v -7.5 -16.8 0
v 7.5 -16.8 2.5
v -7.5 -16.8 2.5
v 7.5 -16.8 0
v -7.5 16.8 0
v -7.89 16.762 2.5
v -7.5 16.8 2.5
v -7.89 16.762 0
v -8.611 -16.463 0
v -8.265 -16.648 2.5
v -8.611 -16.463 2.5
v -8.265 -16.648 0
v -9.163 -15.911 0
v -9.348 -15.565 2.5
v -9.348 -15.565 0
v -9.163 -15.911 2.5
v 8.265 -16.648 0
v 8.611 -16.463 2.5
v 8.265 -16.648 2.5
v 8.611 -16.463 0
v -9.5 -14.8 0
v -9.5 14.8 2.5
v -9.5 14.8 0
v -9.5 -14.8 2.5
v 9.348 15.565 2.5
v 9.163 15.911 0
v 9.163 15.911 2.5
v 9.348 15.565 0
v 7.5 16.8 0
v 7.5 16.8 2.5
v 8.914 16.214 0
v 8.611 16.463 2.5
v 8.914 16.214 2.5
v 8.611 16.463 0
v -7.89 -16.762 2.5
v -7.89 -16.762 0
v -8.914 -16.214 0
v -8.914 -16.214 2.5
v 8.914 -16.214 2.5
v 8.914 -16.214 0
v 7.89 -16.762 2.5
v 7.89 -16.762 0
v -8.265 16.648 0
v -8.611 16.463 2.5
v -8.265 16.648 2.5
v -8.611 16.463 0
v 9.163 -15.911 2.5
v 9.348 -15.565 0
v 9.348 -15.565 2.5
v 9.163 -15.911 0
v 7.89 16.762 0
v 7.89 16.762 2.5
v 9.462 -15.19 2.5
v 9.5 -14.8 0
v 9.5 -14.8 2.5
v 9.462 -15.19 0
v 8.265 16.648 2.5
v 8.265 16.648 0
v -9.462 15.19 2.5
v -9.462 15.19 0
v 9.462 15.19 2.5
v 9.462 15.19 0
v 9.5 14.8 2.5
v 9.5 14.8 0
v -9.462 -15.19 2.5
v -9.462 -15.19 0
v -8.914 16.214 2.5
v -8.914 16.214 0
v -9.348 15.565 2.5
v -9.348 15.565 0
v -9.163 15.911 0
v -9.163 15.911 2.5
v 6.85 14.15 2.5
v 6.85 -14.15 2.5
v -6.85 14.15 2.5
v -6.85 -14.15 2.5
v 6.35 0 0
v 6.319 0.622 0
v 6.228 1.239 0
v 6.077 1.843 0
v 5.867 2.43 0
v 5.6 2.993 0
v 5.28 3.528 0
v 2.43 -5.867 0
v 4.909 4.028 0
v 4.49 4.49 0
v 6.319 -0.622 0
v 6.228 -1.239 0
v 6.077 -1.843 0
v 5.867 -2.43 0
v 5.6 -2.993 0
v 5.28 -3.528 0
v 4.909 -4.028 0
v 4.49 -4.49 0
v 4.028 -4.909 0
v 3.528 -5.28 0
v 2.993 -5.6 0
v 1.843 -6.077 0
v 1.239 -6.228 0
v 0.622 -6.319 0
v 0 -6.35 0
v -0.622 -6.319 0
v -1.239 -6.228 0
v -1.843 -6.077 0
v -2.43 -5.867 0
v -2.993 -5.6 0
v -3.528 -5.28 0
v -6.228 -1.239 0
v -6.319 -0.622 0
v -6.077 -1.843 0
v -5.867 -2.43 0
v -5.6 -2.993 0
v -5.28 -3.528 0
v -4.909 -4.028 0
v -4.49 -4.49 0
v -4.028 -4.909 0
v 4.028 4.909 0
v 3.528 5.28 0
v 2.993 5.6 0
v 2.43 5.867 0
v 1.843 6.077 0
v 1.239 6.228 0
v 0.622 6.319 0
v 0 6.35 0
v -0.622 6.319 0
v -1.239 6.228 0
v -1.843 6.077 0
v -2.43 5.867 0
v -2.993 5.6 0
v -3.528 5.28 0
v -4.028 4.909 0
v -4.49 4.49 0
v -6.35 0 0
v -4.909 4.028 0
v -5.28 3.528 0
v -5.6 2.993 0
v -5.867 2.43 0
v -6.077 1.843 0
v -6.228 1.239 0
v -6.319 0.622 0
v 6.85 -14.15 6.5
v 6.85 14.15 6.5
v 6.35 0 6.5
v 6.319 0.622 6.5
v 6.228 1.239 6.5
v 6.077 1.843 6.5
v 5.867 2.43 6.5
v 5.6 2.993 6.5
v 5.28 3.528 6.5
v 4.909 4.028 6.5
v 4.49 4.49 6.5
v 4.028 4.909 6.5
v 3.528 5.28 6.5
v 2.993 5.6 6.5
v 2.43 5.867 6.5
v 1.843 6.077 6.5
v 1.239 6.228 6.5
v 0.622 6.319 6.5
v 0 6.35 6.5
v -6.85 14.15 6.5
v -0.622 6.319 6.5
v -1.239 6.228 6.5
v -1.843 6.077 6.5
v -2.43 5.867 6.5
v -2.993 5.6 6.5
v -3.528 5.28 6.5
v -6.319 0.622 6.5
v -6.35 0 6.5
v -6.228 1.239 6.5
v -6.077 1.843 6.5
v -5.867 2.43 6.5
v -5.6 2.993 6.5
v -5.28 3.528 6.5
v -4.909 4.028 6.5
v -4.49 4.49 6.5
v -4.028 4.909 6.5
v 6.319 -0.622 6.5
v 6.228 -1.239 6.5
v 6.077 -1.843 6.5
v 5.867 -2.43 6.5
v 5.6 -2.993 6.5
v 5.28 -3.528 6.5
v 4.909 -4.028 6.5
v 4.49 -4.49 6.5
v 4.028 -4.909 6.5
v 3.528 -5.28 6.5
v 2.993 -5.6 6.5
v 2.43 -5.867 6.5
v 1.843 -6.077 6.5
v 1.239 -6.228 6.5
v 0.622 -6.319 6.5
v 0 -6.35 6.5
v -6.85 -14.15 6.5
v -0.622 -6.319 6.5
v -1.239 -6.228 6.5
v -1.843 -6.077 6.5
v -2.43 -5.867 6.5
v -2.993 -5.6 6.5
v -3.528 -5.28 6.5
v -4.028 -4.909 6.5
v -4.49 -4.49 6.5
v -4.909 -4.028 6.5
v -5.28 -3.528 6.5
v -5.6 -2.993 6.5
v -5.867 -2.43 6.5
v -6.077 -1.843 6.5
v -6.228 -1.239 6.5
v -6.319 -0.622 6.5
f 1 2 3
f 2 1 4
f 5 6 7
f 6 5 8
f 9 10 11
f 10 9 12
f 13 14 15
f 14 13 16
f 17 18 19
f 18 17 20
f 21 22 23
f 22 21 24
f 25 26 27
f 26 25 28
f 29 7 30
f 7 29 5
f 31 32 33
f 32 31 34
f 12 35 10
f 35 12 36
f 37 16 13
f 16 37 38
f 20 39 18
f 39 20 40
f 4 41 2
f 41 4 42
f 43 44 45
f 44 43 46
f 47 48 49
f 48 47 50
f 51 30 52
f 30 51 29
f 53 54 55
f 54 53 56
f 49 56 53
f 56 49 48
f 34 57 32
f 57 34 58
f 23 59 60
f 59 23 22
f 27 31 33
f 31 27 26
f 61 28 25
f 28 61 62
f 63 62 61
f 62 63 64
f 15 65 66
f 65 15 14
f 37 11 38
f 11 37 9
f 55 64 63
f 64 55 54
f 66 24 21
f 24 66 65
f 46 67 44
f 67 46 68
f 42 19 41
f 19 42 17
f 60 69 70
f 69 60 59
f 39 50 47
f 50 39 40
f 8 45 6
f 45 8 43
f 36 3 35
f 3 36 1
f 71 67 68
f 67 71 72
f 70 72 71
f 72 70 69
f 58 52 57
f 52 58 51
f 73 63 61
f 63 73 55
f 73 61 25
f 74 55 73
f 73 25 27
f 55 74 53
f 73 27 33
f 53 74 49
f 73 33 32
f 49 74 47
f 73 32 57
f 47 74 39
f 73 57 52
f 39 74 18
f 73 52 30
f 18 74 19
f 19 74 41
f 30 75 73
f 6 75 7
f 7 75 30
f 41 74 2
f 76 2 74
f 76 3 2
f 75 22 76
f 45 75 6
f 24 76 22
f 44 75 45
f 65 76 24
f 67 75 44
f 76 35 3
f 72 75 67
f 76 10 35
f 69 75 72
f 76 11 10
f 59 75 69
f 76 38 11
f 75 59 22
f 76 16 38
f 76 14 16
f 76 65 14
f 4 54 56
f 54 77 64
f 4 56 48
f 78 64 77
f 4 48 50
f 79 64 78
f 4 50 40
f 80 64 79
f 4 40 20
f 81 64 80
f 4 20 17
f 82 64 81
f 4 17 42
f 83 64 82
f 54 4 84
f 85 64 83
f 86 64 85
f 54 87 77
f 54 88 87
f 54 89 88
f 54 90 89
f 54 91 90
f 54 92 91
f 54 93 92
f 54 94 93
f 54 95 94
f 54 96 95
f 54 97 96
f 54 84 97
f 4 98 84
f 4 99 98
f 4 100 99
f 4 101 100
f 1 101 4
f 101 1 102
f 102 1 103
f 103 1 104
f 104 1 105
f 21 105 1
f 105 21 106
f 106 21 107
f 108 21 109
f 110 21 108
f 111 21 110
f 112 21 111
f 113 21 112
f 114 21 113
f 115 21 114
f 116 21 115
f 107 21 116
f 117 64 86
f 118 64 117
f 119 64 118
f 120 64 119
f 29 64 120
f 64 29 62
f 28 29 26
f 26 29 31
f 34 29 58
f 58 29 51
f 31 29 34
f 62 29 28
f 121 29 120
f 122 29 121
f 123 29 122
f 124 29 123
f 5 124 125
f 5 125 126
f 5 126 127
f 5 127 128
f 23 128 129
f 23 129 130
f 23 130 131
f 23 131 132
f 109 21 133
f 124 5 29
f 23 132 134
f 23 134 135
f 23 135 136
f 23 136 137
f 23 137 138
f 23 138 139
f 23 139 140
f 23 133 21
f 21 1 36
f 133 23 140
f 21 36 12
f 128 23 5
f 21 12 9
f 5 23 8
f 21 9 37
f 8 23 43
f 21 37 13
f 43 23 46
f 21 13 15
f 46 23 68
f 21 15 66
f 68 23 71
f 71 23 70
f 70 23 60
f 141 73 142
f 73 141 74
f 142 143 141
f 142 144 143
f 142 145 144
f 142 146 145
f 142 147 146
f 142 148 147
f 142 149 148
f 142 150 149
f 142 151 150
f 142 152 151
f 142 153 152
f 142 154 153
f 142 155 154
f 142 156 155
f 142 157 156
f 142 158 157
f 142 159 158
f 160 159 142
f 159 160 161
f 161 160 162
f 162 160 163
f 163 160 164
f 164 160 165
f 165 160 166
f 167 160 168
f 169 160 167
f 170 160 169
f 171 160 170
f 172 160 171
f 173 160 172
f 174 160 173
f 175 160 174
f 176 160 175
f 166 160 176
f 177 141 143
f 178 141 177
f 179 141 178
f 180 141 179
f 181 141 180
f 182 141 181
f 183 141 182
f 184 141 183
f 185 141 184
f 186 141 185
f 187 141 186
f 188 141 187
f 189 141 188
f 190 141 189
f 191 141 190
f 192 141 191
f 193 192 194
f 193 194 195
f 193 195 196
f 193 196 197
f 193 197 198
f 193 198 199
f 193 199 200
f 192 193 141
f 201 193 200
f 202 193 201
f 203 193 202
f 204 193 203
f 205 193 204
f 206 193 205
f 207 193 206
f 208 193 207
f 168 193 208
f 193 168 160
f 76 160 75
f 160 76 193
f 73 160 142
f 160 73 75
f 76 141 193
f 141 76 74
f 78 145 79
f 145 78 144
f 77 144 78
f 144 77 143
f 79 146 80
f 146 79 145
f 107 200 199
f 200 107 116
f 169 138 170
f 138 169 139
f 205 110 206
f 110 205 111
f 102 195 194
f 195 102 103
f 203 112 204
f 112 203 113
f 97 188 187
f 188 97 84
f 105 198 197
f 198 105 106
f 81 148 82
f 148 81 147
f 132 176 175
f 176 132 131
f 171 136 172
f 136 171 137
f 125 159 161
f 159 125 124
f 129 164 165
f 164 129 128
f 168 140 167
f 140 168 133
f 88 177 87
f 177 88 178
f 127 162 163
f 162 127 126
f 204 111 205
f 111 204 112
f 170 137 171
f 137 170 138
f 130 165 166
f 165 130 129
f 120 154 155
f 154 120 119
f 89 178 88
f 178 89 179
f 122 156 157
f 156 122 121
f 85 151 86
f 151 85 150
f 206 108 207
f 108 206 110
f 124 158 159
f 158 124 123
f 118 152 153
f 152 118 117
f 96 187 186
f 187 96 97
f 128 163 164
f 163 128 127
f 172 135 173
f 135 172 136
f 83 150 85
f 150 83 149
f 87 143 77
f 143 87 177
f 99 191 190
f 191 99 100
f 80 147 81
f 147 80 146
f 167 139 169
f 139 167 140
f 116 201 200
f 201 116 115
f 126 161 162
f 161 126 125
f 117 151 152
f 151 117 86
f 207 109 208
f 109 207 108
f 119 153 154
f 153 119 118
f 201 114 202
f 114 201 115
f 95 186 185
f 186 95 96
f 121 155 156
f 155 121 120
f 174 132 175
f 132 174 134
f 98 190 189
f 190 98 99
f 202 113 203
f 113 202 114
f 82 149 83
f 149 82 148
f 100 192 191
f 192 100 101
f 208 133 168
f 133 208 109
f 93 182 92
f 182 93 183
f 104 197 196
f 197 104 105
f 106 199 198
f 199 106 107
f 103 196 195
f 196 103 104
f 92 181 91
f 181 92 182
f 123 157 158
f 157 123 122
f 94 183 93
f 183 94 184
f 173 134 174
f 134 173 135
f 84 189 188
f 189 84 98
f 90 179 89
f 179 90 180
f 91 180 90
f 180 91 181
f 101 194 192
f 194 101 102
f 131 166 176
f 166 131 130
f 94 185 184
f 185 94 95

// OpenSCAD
// ============================================================
// Rocker-to-Toggle Switch Adapter Plate
// ============================================================
// Fills a Gardner Bender GSW-41 rocker switch panel cutout and
// provides a mounting hole for a standard toggle switch.
//
// Rocker switch cutout (GSW-41): 0.550" x 1.125" (14mm x 28.58mm)
//
// HOW TO USE:
//   1. Measure your toggle switch bushing/thread outer diameter
//   2. Set `toggle_hole_dia` to that value (see notes below)
//   3. Measure your enclosure panel thickness; set `panel_thickness`
//   4. Print with PLA/PETG, 3+ perimeters, 30%+ infill, no supports
//   5. Press adapter into the cutout from the outside; the flange
//      sits flush on the panel surface. Secure with toggle switch
//      nut from the inside.
//
// PRINT ORIENTATION: flange face DOWN on the build plate.
// ============================================================

// ---------- KEY PARAMETERS (adjust these) ----------

// Outer diameter of your toggle switch bushing/threads (mm).
// Gardner Bender GSW-series toggle switches (GSW-18, GSW-124, etc.)
// require a 1/2" (12.7 mm) panel hole.
//
// Common values:
//   6.0  = mini toggle (small/inexpensive units)
//   6.35 = 1/4" standard toggle
//  12.0  = 15/32" medium toggle
//  12.7  = 1/2" full-size toggle (Gardner Bender GSW series default)
//
// ⚠ IMPORTANT — narrow-wall warning:
// The rocker cutout is only 14 mm wide. With a 12.7 mm hole the
// wall on each side is ~0.5 mm. This is thin but acceptable because
// the toggle's locking nut (tightened from inside the box) provides
// the retention force. Use 3+ perimeters and 100% infill, or print
// in PETG for extra toughness.
toggle_hole_dia = 12.7;

// Thickness of the panel the rocker switch was mounted in (mm).
// Measure with calipers. A typical ABS/polycarbonate project box
// wall is 2–4mm. Use 3.0 as a starting estimate.
panel_thickness = 3.0;

// ---------- ROCKER CUTOUT DIMENSIONS (GSW-41, do not change) ----------
rocker_w = 14.0;   // 0.550" = 13.97 mm
rocker_h = 28.6;   // 1.125" = 28.58 mm

// ---------- FIT & GEOMETRY PARAMETERS ----------

// Reduce plug body by this amount (each side) for press-fit clearance.
// 0.15 mm per side (0.3 mm total) works well on most FDM printers.
// Increase to 0.2 if it's too tight after printing.
fit_clearance = 0.15;

// How far the flange lip overhangs the cutout on each side (mm).
flange_overhang = 2.5;

// Thickness of the flange (the visible face plate).
flange_thickness = 2.5;

// Corner radius on the flange (cosmetic).
flange_corner_r  = 2.0;

// Extra plug depth beyond the panel so the fit has some grip
// before the toggle nut is tightened. 1 mm is plenty.
plug_extra_depth = 1.0;

// ---------- DERIVED DIMENSIONS (do not edit) ----------
plug_w     = rocker_w - fit_clearance * 2;
plug_h_dim = rocker_h - fit_clearance * 2;
plug_depth = panel_thickness + plug_extra_depth;

flange_w = rocker_w + flange_overhang * 2;
flange_h = rocker_h + flange_overhang * 2;

total_height = flange_thickness + plug_depth;

// ============================================================
// MODEL
// Print orientation: flange face on build plate (Z=0).
// Z increases upward through the plug.
// ============================================================
difference() {
    union() {
        // Flange — rests on panel exterior, centered at (0,0)
        rounded_rect(flange_w, flange_h, flange_thickness, flange_corner_r);

        // Plug body — inserts into the rocker cutout
        // Cube bottom starts at z=flange_thickness; center=true needs
        // the translate at the cube's center: flange_thickness + plug_depth/2
        translate([0, 0, flange_thickness + plug_depth / 2])
            cube([plug_w, plug_h_dim, plug_depth], center = true);
    }

    // Toggle switch mounting hole — centered, runs full height + margin
    translate([0, 0, total_height / 2])
        cylinder(h = total_height + 2, d = toggle_hole_dia,
                 center = true, $fn = 64);
}

// ============================================================
// Helper: rounded-corner rectangle, centered at origin in X/Y,
// bottom face at Z=0, top face at Z=depth.
// ============================================================
module rounded_rect(w, h, depth, r) {
    hull() {
        for (x = [-w/2 + r, w/2 - r])
            for (y = [-h/2 + r, h/2 - r])
                translate([x, y, 0])
                    cylinder(h = depth, r = r, $fn = 32);
    }
}

// ============================================================
// Mounting Hole Cutout — panel cutout for a toggle switch with
// a cylindrical body, two parallel flats, and an anti-rotation
// notch on the right side.
//
// Datasheet geometry:
//   Circle diameter  : 12.53 +0.0/-0.2 mm  → r = 6.265 mm
//   Width across flats: 11.0 ± 0.1 mm      → flats at x = ±5.5 mm
//   Notch offset     : 1.5 ± 0.1 mm from centerline (y = +1.5 mm)
//
// Usage: use mounting_hole_cutout() inside a difference() to cut
// through a panel.  The bottom face sits at Z=0; top at Z=depth.
// ============================================================
module mounting_hole_cutout(depth = 3) {
    r      = 12.53 / 2;  // 6.265 mm — circle radius
    flat_x = 11.0  / 2;  // 5.5 mm  — half of width-across-flats

    union() {
        // Main body: full cylinder with the two vertical flats removed
        difference() {
            cylinder(h = depth, d = 12.53, $fn = 64);

            // Left flat  — remove everything beyond x = -5.5 mm
            translate([-(r + 1), -(r + 1), -0.5])
                cube([r + 1 - flat_x, 2 * (r + 1), depth + 1]);

            // Right flat — remove everything beyond x = +5.5 mm
            translate([flat_x, -(r + 1), -0.5])
                cube([r + 1 - flat_x, 2 * (r + 1), depth + 1]);
        }

        // Anti-rotation notch on the right side.
        // Rectangle: 1.5 mm wide (x), 1.5 mm tall (y),
        // centered at y = +1.5 mm above the horizontal centerline.
        translate([flat_x, 1.5 - 0.75, 0])
            cube([1.5, 1.5, depth]);
    }
}
